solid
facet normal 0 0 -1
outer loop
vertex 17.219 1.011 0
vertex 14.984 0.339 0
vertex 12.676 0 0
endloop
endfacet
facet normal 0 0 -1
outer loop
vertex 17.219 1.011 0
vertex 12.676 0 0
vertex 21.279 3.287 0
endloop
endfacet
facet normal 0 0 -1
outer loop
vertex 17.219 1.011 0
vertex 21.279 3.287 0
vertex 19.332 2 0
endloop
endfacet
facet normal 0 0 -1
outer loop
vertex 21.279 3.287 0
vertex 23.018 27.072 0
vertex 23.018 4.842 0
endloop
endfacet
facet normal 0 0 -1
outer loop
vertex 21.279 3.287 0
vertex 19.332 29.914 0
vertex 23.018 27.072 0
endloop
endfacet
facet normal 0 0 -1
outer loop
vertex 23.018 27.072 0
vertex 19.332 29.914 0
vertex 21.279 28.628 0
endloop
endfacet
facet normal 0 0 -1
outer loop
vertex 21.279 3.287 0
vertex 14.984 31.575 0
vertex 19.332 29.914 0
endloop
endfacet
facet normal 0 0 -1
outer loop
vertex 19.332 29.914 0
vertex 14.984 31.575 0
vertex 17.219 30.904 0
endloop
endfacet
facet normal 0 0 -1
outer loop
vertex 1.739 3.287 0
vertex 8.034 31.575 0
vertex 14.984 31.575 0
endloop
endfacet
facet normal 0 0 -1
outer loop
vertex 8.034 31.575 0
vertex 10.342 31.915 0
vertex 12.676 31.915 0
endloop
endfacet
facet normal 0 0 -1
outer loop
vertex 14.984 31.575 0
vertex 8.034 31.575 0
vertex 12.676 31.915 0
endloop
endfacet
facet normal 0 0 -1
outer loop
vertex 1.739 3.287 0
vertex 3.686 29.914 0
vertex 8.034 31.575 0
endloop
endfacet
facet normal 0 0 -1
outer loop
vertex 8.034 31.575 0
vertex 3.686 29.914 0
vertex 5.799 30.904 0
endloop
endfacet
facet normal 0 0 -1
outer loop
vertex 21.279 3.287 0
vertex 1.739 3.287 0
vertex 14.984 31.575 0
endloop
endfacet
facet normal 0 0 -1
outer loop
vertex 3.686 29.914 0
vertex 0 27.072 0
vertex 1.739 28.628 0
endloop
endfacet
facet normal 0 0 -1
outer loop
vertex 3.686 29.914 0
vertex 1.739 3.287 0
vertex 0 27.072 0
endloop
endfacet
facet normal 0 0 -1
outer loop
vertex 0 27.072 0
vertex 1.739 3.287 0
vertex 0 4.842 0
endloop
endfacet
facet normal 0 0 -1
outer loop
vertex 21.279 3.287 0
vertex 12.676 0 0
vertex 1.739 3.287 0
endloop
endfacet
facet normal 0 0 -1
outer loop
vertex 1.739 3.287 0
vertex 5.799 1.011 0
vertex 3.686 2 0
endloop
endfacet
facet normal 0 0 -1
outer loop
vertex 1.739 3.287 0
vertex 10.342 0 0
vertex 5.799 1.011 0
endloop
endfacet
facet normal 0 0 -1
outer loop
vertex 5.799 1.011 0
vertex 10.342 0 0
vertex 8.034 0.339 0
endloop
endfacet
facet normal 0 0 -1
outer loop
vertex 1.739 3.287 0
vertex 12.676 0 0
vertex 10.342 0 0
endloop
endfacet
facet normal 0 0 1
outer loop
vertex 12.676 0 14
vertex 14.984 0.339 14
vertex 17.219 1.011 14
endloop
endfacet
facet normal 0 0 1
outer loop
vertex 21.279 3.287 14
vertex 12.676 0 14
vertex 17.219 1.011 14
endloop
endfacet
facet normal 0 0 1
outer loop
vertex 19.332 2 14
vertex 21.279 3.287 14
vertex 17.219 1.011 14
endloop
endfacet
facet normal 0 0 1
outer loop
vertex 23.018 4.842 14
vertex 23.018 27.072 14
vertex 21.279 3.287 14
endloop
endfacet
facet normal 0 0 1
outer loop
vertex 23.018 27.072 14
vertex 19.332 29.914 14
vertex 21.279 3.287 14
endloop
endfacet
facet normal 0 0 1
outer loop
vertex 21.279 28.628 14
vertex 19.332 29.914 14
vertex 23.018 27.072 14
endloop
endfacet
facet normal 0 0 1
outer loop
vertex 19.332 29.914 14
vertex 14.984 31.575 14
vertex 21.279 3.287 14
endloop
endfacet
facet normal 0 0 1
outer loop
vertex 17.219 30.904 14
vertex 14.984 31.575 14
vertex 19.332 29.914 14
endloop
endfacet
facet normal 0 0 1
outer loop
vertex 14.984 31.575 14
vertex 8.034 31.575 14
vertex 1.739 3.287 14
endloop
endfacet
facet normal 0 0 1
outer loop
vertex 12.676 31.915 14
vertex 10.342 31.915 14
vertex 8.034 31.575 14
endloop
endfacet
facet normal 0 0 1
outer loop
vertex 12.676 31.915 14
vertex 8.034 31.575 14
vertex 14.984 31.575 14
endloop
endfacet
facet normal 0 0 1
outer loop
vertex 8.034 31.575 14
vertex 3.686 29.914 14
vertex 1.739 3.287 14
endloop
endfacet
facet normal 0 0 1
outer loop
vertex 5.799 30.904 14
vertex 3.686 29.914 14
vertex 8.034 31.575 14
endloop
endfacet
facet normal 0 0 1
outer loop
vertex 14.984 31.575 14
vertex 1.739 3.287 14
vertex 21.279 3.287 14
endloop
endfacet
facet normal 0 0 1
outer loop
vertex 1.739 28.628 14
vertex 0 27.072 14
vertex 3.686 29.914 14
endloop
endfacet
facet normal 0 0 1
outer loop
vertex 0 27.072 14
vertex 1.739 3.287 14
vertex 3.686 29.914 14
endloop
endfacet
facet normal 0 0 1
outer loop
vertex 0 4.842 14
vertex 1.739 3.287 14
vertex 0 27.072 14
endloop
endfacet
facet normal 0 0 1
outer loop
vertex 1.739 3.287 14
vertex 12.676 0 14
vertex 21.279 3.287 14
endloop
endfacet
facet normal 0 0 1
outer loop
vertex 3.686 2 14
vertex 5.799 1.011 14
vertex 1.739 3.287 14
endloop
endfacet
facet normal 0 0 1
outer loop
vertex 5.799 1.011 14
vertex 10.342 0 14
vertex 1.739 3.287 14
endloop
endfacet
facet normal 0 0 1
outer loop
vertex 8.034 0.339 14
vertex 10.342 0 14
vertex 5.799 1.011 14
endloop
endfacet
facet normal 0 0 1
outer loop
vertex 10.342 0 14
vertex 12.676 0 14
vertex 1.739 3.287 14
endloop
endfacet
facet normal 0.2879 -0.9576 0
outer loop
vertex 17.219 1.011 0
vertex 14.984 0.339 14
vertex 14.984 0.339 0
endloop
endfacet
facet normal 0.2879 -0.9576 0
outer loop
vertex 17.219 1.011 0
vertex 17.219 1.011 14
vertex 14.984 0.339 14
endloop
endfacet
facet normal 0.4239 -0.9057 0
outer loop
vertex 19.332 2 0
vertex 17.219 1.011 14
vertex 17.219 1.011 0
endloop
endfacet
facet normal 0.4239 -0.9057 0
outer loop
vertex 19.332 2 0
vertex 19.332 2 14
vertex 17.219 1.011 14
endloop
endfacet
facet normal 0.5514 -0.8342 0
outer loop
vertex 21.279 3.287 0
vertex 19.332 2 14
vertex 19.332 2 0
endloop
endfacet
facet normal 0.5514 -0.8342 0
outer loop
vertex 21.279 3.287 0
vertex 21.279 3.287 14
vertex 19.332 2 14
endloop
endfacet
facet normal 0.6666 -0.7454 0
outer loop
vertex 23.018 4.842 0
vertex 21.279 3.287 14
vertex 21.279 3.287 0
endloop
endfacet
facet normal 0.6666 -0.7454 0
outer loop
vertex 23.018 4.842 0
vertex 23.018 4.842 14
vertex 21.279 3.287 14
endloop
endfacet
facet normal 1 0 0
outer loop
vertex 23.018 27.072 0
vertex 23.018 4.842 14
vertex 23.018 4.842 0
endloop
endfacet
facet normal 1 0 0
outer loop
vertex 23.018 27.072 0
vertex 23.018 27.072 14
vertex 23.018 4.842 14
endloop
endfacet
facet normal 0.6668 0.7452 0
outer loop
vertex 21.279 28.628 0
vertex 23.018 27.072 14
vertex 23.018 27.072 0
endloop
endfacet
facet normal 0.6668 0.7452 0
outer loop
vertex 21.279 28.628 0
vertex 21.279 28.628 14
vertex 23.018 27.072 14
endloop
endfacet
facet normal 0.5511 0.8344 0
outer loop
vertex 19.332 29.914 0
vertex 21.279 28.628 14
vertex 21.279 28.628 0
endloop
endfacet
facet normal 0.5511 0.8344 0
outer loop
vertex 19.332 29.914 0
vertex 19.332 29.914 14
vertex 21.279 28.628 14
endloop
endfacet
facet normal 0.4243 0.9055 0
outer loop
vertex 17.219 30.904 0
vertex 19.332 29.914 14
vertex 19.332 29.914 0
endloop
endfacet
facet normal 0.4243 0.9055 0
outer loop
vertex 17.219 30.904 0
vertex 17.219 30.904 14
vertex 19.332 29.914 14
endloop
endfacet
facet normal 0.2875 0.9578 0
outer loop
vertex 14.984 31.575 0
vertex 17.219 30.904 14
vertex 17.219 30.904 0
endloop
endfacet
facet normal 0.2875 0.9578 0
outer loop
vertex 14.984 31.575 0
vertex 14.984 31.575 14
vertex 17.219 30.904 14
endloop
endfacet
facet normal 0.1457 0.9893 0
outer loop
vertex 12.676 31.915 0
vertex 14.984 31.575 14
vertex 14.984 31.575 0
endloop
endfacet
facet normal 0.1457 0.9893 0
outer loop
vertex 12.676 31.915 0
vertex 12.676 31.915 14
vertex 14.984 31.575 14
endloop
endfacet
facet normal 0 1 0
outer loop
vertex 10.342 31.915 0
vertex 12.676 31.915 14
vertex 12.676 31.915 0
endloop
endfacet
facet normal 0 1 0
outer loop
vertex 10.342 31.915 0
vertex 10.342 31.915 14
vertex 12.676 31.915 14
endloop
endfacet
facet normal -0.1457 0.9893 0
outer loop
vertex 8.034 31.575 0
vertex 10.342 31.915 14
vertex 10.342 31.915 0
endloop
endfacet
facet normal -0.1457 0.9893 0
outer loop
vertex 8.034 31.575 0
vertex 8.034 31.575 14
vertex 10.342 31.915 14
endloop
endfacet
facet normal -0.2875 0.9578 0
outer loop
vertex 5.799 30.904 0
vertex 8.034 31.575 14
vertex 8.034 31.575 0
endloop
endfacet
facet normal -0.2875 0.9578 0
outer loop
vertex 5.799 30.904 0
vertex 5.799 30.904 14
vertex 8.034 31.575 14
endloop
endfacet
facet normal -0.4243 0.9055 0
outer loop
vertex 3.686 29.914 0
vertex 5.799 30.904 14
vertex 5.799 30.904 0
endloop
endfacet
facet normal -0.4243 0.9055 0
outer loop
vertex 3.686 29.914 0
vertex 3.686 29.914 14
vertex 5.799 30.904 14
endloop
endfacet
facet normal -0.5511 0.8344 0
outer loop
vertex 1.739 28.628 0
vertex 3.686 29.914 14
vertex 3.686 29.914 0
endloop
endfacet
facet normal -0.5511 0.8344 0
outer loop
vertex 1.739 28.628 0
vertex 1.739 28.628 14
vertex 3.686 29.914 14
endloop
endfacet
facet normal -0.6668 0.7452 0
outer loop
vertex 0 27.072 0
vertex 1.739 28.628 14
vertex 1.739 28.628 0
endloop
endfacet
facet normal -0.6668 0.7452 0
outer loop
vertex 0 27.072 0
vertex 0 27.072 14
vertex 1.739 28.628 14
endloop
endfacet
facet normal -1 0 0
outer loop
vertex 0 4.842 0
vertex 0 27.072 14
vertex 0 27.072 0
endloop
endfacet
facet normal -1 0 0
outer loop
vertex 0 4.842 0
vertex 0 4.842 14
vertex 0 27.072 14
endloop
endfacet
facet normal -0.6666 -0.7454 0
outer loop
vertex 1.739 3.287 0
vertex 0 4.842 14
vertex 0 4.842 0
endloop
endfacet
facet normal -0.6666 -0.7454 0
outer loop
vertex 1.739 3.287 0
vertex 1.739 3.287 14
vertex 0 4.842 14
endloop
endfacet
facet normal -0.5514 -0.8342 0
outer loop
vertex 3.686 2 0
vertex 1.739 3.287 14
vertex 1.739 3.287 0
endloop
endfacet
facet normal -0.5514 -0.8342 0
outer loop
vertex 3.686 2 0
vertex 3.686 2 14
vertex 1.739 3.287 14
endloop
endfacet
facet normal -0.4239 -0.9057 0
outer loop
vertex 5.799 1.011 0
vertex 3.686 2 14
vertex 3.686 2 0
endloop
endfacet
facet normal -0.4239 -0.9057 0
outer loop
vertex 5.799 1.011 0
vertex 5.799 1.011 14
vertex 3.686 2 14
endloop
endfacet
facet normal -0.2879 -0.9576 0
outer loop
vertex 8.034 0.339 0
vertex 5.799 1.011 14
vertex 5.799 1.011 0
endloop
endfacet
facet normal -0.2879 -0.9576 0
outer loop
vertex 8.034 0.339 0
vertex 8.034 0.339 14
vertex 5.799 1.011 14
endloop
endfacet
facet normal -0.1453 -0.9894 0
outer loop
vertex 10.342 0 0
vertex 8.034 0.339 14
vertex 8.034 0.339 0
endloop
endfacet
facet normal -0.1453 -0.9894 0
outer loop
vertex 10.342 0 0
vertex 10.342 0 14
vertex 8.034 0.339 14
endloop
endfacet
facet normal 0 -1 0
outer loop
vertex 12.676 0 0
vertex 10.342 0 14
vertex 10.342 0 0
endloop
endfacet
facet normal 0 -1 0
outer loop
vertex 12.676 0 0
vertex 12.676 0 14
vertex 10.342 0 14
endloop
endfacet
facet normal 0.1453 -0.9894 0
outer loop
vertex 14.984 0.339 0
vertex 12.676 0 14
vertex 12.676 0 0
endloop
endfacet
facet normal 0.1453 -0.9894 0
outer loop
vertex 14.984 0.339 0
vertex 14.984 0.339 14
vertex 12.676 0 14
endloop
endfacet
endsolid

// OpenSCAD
$fn = 32;

// ----------------------------------------------------------------------
// Flat adaptor: double_d, 14 mm thick
// ----------------------------------------------------------------------

// --- parameters (mm) ---
profile_height = 14;      // extrusion height
profile_points = 24;      // points of the closed outline

profile = [[23.018, 27.072], [21.279, 28.628], [19.332, 29.914], [17.219, 30.904], [14.984, 31.575], [12.676, 31.915], [10.342, 31.915], [8.034, 31.575], [5.799, 30.904], [3.686, 29.914], [1.739, 28.628], [0, 27.072], [0, 4.842], [1.739, 3.287], [3.686, 2], [5.799, 1.011], [8.034, 0.339], [10.342, 0], [12.676, 0], [14.984, 0.339], [17.219, 1.011], [19.332, 2], [21.279, 3.287], [23.018, 4.842]];  // single closed polygon, 24 points, counter clockwise

// --- the one profile operation ---
linear_extrude(height = profile_height) polygon(points = profile);
